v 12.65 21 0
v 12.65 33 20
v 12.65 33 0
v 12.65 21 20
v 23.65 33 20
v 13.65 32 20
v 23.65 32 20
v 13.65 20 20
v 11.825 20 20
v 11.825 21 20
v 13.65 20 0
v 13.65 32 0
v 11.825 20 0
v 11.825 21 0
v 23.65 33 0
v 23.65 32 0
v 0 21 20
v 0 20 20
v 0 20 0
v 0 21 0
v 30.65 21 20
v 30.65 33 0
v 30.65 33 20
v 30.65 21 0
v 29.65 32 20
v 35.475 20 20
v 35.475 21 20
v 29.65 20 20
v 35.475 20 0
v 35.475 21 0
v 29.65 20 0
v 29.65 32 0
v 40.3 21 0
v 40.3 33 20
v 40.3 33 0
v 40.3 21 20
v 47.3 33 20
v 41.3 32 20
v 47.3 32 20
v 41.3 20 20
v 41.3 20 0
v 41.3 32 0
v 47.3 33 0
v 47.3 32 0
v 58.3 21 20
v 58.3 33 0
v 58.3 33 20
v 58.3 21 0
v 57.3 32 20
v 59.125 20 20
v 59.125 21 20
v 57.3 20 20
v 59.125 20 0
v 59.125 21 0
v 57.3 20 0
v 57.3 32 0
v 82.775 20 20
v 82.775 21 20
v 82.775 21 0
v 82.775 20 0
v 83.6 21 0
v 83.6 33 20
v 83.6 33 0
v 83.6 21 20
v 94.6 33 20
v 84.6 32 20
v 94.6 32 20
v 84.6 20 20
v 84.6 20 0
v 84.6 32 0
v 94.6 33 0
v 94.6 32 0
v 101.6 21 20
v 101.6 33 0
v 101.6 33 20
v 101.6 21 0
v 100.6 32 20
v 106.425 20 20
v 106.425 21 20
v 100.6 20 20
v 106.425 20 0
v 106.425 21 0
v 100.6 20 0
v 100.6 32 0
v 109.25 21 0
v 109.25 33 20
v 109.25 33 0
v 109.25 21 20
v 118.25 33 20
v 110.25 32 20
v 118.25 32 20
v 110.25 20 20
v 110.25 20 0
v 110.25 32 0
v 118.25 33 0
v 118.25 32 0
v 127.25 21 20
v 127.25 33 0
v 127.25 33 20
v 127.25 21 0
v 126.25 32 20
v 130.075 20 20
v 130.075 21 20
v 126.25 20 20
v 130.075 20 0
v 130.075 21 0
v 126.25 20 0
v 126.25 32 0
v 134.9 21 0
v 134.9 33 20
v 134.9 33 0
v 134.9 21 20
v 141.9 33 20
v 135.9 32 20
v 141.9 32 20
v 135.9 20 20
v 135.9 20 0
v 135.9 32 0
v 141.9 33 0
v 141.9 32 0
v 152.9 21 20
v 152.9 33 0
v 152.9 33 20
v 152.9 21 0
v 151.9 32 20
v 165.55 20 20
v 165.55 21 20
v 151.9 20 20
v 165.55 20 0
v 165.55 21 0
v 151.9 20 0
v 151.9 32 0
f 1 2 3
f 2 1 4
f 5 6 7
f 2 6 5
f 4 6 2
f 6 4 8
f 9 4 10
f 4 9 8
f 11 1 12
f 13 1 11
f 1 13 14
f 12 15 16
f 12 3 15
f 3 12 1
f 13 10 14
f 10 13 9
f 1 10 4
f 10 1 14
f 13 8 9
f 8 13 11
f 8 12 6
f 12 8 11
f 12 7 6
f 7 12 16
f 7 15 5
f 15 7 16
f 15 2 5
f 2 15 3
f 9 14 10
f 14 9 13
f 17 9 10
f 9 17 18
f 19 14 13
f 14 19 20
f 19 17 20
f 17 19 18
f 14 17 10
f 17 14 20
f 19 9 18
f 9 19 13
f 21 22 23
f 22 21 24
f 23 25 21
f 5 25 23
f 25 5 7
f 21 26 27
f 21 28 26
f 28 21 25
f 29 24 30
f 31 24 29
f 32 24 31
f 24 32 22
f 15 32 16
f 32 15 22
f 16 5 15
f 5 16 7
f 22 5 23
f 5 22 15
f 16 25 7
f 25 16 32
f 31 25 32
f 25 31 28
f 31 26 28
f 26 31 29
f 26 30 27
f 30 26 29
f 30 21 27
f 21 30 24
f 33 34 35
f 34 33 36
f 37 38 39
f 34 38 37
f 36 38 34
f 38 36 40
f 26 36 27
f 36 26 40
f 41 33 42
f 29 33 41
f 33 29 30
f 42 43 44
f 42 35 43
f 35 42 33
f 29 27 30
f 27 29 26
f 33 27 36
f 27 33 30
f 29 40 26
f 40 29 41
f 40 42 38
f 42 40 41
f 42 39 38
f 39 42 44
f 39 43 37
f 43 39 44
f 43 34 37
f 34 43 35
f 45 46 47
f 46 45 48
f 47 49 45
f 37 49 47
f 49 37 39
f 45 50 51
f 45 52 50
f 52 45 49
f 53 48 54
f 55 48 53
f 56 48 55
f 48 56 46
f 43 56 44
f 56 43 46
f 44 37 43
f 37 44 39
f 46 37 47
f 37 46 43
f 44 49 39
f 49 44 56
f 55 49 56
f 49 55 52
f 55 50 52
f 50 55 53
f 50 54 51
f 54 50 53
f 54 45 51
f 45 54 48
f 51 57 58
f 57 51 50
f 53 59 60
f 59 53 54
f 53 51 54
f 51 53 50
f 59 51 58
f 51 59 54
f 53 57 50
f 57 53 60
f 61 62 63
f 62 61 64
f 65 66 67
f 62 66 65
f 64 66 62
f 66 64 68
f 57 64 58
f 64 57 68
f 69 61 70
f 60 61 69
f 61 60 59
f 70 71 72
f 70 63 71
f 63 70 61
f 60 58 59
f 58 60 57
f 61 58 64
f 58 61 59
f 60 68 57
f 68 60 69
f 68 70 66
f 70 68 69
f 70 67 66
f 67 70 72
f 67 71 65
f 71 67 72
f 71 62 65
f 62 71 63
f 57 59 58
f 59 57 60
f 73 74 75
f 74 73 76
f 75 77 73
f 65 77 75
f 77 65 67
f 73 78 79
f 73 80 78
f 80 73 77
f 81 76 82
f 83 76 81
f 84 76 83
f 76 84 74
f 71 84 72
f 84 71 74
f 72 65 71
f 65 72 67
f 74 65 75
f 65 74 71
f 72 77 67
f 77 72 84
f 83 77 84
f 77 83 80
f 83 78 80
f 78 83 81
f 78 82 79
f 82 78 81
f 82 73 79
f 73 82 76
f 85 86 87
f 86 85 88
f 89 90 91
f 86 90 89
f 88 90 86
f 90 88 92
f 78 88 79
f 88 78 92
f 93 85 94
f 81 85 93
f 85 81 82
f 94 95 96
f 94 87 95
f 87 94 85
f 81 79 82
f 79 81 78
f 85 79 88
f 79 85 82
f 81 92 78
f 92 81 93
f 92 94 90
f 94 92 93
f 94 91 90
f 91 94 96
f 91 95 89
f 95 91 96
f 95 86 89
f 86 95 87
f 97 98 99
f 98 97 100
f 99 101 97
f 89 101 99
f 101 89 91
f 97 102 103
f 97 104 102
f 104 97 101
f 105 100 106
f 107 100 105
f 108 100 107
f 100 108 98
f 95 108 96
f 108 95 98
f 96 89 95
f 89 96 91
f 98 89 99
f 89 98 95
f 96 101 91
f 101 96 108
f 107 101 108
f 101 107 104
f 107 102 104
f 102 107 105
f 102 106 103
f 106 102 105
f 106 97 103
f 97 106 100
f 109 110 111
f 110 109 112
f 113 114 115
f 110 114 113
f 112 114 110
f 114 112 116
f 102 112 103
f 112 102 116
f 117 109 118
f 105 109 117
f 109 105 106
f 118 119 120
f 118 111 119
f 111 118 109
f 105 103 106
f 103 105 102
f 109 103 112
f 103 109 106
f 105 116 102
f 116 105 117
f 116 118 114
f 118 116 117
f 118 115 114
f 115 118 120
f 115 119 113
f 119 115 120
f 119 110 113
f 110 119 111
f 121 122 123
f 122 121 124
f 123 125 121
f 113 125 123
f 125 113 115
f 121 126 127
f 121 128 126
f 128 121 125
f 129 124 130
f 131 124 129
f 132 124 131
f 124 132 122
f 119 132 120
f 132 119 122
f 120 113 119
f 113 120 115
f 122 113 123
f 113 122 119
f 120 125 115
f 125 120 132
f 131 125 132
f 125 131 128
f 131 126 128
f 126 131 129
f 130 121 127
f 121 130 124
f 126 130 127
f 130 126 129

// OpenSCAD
// White keys geometry
w_width  = 22.65; // x axis
w_height = 20;    // y axis
w_depth  = 150;   // z axis
w_gap    = 1; // Distance between two white keys

// Black keys geometry
// *_high is at the shape of the top of the black key
// *_low is at the shape of the bottom of the black key
b_width_low   = 15;
b_height_low  = 24;
b_depth_low   = 90;
b_width_high  = 10;
b_depth_high  = 50;
b_height_high = 11+(w_height-b_height_low);
b_height      = b_height_low + b_height_high;
b_width       = b_width_low;
b_jitter      = 2; // Offset on x axis of black keys, starting from middle position

// Pianoled stuff parameters
pl_depth  = 20;   // z axis size
pl_height = 12;   // y size, excludes thickness
pl_margin = 0.5;  // x axis margin near black keys
pl_thickness = 1; // thickness of plastic

// Define first note and number of white keys
first_note  = 0; // 0 is C, 1 is D, etc...
note_counts = 7; // Number of white keys to draw

//draw_keyboard(); // Uncomment to draw keyboard keys below the frame
draw_pianoled();

// Draw the whole plastic frame, based on notes_count and first_note
module draw_pianoled()
{
    union() {
        for (i = [0:note_counts-1]) {
            falling = is_prev_black(i);
            rising  = is_next_black(i);
            
            color("purple") {
                    
                translate([i * (w_width + w_gap), 0, 0]) {
                    if (falling)
                        draw_part(-1, i);
                    else
                        draw_part(0, i);
                }
        
                translate([(i+0.5) * (w_width + w_gap), 0, 0]) {
                    if (rising)
                        draw_part(1, i);
                    else
                        draw_part(0, i);
                }
            }
        }
    }
}

// determine the height (y axis) where the pianoled touches the keyboard
function low_height() = pl_height > (b_height - w_height) ? w_height : (b_height - pl_height);

// determine the height (y axis) where the pianoled top edge is
function high_height() = pl_height > (b_height - w_height) ? w_height + pl_height : low_height() + pl_height;

// Draw a part of the plastic frame.
// Each white key is made of two parts :
//  - the first may be falling (if there is a black key on the left), or straight
//  - the second may be rising (if there is a black key on the right), or straight
// direction =  0 : straight
// direction = -1 : falling
// direction =  1 : rising
// i is the number of the associated white key
module draw_part(direction, i)
{
    rising   = (direction ==  1);
    falling  = (direction == -1);
    straight = (direction ==  0);
    
    // Will black or white keys support the stuff ?
    h_high = high_height();
    h_low  = low_height();

    if (straight) {
        translate([0, h_low, 0]) {
            cube([(w_width + w_gap) / 2, pl_thickness, pl_depth]);
        }
    }
    else if (falling) {
        w1  = b_width / 2 + pl_margin + pl_thickness + get_b_jitter(i-1);
        w2  = (w_width + w_gap) / 2 - w1;
        translate([0, h_high, 0]) {
            cube([w1, pl_thickness, pl_depth]);
        }
        translate([w1 - pl_thickness, h_low, 0]) {
            cube([pl_thickness, pl_height, pl_depth]);
        }
        translate([w1, h_low, 0]) {
            cube([w2, pl_thickness, pl_depth]);
        }
    }
    else
    {
        w2  = b_width / 2 + pl_margin + pl_thickness - get_b_jitter(i);
        w1  = (w_width + w_gap) / 2 - w2;
        translate([0, h_low, 0]) {
            cube([w1, pl_thickness, pl_depth]);
        }
        translate([w1, h_low, 0]) {
            cube([pl_thickness, pl_height, pl_depth]);
        }
        translate([w1, h_high, 0]) {
            cube([w2, pl_thickness, pl_depth]);
        }
    }
}

// Draw the whole keyboard, based on note_counts and first_note
module draw_keyboard()
{
    for (i = [0:note_counts-1]) {
        white_key(i);
        
        if (is_next_black(i))
            black_key(i);
    }
}

// Draw white key i
module white_key(i) {
    difference() {
        color("White") {
        translate([i * (w_width + w_gap), 0, 0]) cube([w_width, w_height, w_depth]);
        }
        union() {
            if (is_prev_black(i))
                black_key(i-1);
            if (is_next_black(i))
                black_key(i);
        }
    }
}

// return true if white key i a C
function is_c(i) =
(
    ((i+first_note)%7 == 0)
);

// return true if white key i a E
function is_e(i) =
(
    ((i+first_note)%7 == 2)
);

// return true if white key i a F
function is_f(i) =
(
    ((i+first_note)%7 == 3)
);

// return true if white key i a B
function is_b(i) =
(
    ((i+first_note)%7 == 6)
);

// return true if this is white key i the last of the keyboard
function is_last_white(i) =
(
    (i + 1 == note_counts)
);

// return true if this is white key i the first of the keyboard
function is_first_white(i) =
(
    (i == 0)
);

// return true if there is a black key before white key i
function is_prev_black(i) =
(
    (!is_first_white(i) && !is_c(i) && !is_f(i))
);

// return true if there is a black key after white key i
function is_next_black(i) =
(
    (!is_last_white(i) && !is_e(i) && !is_b(i))
);

// calculate x offset of black key
function get_b_jitter(i) =
(
    is_c(i) || is_f(i)) ? -b_jitter : (is_e(i+1) || is_b(i+1) ? b_jitter : 0
);

// draw black key following white key i
module black_key(i) {
    wl = b_width_low;   // low  width , x axis
    wh = b_width_high;  // high width , x axis
    hl = b_height_low;  // low  height, y axis
    hh = b_height_high; // high height, y axis
    dl = b_depth_low;   // low  depth , z axis
    dh = b_depth_high;  // high depth , z axis
    
    // Black key shape, starting from 0
    bk_points = [
        [ 0, 0, 0], // 0
        [ 0, 0,dl], // 1
        [wl, 0,dl], // 2
        [wl, 0, 0], // 3
        [ 0,hl, 0], // 4
        [ 0,hl,dl], // 5
        [wl,hl,dl], // 6
        [wl,hl, 0], // 7
        [(wl-wh)/2,hl+hh, 0], // 8
        [(wl-wh)/2,hl+hh,dh], // 9
        [(wl+wh)/2,hl+hh,dh], // 10
        [(wl+wh)/2,hl+hh, 0]  // 11
    ];
    
    bk_faces = [
        [0, 1, 2, 3],
        [0, 4, 5, 1],
        [5, 6, 2, 1],
        [2, 6, 7, 3],
        [4, 8, 9, 5],
        [9, 10, 6, 5],
        [6, 10, 11, 7],
        [8, 11, 10, 9],
        [0, 3, 7, 11, 8, 4]
    ];
    
    translate([(i+1) * (w_width + w_gap) - b_width_low / 2 + get_b_jitter(i), 0, 0]) {
        color("DarkSlateGray", 1) {
            polyhedron(bk_points, bk_faces);
        }
    }
}
